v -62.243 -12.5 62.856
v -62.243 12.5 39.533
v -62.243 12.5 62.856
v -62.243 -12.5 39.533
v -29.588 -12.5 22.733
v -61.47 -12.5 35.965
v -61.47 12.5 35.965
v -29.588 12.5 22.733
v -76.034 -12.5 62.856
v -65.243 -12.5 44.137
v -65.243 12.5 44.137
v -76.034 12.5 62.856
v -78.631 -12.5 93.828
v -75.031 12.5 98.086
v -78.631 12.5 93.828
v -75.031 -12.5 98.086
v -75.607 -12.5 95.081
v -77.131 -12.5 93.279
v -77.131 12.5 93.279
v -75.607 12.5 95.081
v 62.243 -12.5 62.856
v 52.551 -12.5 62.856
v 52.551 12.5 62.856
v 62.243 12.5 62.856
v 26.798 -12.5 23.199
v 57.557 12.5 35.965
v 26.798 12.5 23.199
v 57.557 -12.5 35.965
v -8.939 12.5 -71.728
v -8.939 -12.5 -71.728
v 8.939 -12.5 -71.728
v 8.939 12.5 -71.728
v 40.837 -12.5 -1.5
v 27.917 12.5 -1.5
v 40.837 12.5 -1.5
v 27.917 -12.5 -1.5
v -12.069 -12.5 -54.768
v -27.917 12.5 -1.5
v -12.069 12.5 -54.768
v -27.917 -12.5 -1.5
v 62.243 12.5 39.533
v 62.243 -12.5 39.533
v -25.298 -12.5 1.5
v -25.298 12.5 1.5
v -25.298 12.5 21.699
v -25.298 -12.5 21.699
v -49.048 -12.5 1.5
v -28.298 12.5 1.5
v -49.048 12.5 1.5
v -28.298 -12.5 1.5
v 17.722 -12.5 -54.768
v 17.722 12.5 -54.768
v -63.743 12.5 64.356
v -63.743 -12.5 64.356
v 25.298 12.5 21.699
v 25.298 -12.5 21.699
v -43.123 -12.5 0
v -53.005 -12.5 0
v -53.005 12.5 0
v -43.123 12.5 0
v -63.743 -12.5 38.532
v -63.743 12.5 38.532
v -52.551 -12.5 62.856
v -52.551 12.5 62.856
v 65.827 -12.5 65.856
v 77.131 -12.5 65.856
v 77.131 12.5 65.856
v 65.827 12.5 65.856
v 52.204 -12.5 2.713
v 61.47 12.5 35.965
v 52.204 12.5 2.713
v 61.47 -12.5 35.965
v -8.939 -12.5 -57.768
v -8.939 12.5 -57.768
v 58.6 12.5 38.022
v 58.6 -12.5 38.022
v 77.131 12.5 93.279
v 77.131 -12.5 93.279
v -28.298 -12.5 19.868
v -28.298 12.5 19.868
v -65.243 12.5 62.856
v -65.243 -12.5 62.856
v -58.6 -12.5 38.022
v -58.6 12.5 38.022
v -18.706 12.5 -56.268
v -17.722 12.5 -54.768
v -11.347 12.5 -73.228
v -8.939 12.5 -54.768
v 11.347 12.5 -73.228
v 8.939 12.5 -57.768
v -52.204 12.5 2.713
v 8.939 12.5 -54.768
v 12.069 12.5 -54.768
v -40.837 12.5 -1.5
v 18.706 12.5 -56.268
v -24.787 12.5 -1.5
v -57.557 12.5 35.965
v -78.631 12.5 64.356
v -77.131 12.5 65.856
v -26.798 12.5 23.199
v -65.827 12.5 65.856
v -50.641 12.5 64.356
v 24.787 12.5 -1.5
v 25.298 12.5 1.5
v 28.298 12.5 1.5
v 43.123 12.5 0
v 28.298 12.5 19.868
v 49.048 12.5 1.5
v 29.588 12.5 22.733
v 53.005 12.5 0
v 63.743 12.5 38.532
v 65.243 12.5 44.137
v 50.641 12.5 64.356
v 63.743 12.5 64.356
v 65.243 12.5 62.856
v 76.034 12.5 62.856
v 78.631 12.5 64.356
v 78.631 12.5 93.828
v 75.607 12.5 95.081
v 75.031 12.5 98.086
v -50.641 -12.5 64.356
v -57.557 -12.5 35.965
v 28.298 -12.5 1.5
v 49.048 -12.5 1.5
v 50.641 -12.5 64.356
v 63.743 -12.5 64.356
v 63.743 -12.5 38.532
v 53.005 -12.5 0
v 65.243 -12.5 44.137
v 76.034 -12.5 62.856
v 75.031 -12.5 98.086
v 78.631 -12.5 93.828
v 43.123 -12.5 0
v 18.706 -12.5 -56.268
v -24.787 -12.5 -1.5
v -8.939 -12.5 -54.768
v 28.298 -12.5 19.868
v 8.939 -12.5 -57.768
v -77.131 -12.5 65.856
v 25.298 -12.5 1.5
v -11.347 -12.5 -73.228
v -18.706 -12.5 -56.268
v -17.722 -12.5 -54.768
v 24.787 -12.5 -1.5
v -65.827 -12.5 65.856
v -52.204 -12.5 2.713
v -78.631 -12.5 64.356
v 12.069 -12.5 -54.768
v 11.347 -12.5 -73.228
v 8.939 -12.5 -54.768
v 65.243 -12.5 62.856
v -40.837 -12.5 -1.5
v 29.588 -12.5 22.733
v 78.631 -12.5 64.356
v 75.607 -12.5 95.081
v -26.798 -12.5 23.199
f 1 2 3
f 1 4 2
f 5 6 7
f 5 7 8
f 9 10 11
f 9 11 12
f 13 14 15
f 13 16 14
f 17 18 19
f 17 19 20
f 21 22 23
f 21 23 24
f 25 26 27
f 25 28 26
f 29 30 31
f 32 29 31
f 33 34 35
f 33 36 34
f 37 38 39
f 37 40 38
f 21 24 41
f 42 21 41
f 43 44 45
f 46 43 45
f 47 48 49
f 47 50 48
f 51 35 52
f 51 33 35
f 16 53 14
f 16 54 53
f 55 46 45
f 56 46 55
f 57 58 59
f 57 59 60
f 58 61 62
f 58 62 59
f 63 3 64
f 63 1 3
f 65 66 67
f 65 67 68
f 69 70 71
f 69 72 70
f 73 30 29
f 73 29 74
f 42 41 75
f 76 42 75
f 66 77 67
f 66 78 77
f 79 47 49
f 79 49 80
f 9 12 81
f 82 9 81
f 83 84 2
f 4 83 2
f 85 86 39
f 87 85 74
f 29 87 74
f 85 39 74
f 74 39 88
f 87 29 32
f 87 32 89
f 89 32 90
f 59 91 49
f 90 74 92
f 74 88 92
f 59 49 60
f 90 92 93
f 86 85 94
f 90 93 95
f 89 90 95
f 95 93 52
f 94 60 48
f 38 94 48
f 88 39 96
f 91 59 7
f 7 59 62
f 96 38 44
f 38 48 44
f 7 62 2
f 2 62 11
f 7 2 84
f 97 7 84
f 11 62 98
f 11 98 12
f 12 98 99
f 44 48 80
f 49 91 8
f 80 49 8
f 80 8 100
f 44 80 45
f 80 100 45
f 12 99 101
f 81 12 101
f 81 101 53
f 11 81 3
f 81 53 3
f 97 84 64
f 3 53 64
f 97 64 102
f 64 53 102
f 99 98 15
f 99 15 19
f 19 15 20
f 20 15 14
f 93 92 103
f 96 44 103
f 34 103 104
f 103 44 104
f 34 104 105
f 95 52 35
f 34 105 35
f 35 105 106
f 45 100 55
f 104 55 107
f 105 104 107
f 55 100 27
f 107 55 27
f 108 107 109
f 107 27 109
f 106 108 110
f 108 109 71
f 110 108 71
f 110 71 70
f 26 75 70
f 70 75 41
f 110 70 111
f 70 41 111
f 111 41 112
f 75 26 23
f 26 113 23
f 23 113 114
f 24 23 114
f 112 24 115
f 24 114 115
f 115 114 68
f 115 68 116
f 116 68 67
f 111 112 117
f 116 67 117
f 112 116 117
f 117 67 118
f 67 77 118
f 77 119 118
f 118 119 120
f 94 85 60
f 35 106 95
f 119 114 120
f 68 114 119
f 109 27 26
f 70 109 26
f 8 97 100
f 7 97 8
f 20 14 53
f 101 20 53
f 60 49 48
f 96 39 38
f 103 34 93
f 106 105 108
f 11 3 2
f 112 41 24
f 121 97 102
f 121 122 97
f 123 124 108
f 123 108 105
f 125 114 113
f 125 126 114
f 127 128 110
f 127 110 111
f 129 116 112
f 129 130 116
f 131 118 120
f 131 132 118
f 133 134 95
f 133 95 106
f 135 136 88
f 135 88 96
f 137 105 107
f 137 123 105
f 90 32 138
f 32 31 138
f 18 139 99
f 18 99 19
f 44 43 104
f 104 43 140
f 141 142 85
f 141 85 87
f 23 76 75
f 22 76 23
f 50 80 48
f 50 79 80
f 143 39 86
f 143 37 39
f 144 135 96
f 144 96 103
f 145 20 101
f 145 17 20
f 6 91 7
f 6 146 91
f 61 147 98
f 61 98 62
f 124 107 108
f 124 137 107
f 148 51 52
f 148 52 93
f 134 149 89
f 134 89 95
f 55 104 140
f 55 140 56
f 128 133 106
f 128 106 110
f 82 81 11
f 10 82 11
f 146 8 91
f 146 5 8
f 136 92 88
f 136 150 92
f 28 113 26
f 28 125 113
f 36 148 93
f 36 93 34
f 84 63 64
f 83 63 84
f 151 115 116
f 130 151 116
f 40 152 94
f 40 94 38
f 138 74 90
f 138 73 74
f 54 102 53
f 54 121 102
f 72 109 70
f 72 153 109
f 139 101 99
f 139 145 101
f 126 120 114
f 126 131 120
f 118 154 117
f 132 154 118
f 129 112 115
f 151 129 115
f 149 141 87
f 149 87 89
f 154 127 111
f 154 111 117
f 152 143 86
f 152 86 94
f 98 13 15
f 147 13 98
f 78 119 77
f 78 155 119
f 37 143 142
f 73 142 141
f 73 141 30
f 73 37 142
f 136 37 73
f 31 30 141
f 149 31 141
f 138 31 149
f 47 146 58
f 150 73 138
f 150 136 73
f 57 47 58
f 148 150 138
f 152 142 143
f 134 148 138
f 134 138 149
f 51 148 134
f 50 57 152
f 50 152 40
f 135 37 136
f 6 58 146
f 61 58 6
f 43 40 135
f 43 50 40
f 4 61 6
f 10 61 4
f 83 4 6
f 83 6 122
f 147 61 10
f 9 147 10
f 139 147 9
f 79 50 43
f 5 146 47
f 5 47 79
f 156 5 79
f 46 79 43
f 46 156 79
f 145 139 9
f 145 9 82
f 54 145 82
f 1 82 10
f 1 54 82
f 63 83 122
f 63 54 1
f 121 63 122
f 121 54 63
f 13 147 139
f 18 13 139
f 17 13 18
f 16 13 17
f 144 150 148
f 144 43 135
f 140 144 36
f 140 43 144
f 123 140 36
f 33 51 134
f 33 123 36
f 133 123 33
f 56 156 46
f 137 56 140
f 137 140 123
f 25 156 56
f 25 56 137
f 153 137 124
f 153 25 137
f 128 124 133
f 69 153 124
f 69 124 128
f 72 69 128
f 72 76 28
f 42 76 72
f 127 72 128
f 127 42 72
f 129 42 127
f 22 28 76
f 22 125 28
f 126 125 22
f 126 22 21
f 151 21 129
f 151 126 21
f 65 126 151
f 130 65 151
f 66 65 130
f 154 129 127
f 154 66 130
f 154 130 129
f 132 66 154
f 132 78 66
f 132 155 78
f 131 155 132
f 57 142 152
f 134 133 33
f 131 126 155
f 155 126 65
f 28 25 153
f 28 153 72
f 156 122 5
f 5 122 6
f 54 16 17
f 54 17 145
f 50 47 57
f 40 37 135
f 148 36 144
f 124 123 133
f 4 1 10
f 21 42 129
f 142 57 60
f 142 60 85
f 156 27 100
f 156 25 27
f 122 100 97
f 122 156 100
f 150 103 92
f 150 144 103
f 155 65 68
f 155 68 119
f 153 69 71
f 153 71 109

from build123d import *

# Parameters (mm, degrees)
F0_W     = 50.596558
F0_H     = 20.199042
F0_W_2   = 17.877146
F0_H_2   = 13.960166
F1_DEPTH = 12.5


with BuildPart() as f1:
    # F0 (on Front) → F1 (new body, symmetric)
    with BuildSketch(Plane.XZ):
        Polygon((-78.630596, 64.35625), (-63.742905, 64.35625), (-75.031465, 98.085683), (-78.630596, 93.827657), align=None)
        Polygon((-77.130596, 65.85625), (-77.130596, 93.27864), (-75.607495, 95.080575), (-65.826704, 65.85625), align=None, mode=Mode.SUBTRACT)
        Polygon((-78.630596, 64.35625), (-63.742905, 38.531836), (-63.742905, 64.35625), align=None)
        Polygon((-65.242905, 44.137091), (-76.03444, 62.85625), (-65.242905, 62.85625), align=None, mode=Mode.SUBTRACT)
        Polygon((-63.742905, 38.531836), (-57.557297, 35.964679), (-50.641312, 64.35625), (-63.742905, 64.35625), align=None)
        Polygon((-52.550563, 62.85625), (-58.600125, 38.021527), (-62.242905, 39.533357), (-62.242905, 62.85625), align=None, mode=Mode.SUBTRACT)
        Polygon((-53.005233, 0), (-26.798279, 23.199042), (-57.557297, 35.964679), (-63.742905, 38.531836), align=None)
        Polygon((-61.470346, 35.964624), (-29.588011, 22.732788), (-52.20399, 2.712565), align=None, mode=Mode.SUBTRACT)
        Polygon((-43.12326, 0), (-26.798279, 0), (-26.798279, 23.199042), (-53.005233, 0), align=None)
        Polygon((-49.047723, 1.5), (-28.298279, 19.86792), (-28.298279, 1.5), align=None, mode=Mode.SUBTRACT)
        Polygon((-26.798279, 0), (0, 0), (26.798279, 0), (26.798279, 23.199042), (0, 23.199042), (-26.798279, 23.199042), align=None)
        with Locations((0, 11.599521)):
            Rectangle(F0_W, F0_H, mode=Mode.SUBTRACT)
        Polygon((26.798279, 23.199042), (26.798279, 0), (43.12326, 0), (53.005233, 0), align=None)
        Polygon((49.047723, 1.5), (28.298279, 1.5), (28.298279, 19.86792), align=None, mode=Mode.SUBTRACT)
        Polygon((57.557297, 35.964679), (26.798279, 23.199042), (53.005233, 0), (63.742905, 38.531836), align=None)
        Polygon((52.20399, 2.712565), (29.588011, 22.732788), (61.470346, 35.964624), align=None, mode=Mode.SUBTRACT)
        Polygon((50.641312, 64.35625), (57.557297, 35.964679), (63.742905, 38.531836), (63.742905, 64.35625), align=None)
        Polygon((52.550563, 62.85625), (62.242905, 62.85625), (62.242905, 39.533357), (58.600125, 38.021527), align=None, mode=Mode.SUBTRACT)
        Polygon((63.742905, 64.35625), (63.742905, 38.531836), (78.630596, 64.35625), align=None)
        Polygon((65.242905, 44.137091), (65.242905, 62.85625), (76.03444, 62.85625), align=None, mode=Mode.SUBTRACT)
        Polygon((75.031465, 98.085683), (63.742905, 64.35625), (78.630596, 64.35625), (78.630596, 93.827657), align=None)
        Polygon((77.130596, 65.85625), (65.826704, 65.85625), (75.607495, 95.080575), (77.130596, 93.27864), align=None, mode=Mode.SUBTRACT)
        Polygon((26.798279, 0), (0, 0), (-26.798279, 0), (-10.057273, -56.268178), (0, -56.268178), (10.057273, -56.268178), align=None)
        Polygon((-8.938573, -54.768178), (-24.787014, -1.5), (24.787014, -1.5), (8.938573, -54.768178), align=None, mode=Mode.SUBTRACT)
        Polygon((43.12326, 0), (26.798279, 0), (10.057273, -56.268178), (18.706328, -56.268178), align=None)
        Polygon((17.722096, -54.768178), (12.068537, -54.768178), (27.916978, -1.5), (40.837213, -1.5), align=None, mode=Mode.SUBTRACT)
        Polygon((-10.057273, -56.268178), (-26.798279, 0), (-43.12326, 0), (-18.706328, -56.268178), align=None)
        Polygon((-17.722096, -54.768178), (-40.837213, -1.5), (-27.916978, -1.5), (-12.068537, -54.768178), align=None, mode=Mode.SUBTRACT)
        Polygon((0, -56.268178), (-10.057273, -56.268178), (-18.706328, -56.268178), (-11.346658, -73.228344), (0, -73.228344), (11.346658, -73.228344), (18.706328, -56.268178), (10.057273, -56.268178), align=None)
        with Locations((0, -64.748261)):
            Rectangle(F0_W_2, F0_H_2, mode=Mode.SUBTRACT)
    extrude(amount=F1_DEPTH, both=True)


solid = f1.part
